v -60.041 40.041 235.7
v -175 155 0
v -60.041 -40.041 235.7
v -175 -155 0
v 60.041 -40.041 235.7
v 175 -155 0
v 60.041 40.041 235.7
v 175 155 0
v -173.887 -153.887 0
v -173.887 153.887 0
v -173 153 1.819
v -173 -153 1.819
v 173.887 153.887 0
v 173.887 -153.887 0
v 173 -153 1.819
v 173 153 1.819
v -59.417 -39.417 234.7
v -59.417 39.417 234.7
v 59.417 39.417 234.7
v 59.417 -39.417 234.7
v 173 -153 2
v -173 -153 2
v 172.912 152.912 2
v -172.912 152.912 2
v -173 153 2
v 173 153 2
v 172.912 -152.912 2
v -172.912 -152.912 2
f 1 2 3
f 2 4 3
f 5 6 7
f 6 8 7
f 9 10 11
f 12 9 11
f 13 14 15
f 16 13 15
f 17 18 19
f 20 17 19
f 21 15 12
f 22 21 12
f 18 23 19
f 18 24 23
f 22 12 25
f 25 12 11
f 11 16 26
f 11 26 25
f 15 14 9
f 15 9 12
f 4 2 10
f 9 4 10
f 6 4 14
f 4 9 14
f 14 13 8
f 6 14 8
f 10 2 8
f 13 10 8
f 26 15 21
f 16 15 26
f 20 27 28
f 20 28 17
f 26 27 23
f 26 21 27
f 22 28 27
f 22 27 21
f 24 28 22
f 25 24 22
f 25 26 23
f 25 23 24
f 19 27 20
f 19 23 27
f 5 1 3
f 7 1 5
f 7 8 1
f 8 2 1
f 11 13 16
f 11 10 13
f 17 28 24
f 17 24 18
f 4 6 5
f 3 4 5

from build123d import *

# Parameters (mm, degrees)
SKETCH1_W           = 350
SKETCH1_H           = 310
BOSS_EXTRUDE1_DEPTH = 235.7
BOSS_EXTRUDE1_TAPER = 26
SHELL1_T            = -1
SKETCH3_W           = 346
SKETCH3_H           = 306
CUT_EXTRUDE1_DEPTH  = 2


with BuildPart() as part:
    # Sketch1 → Boss-Extrude1 (new body)
    with BuildSketch(Plane.XY):
        Rectangle(SKETCH1_W, SKETCH1_H)
    extrude(amount=BOSS_EXTRUDE1_DEPTH, taper=BOSS_EXTRUDE1_TAPER)

    # Shell1
    shell1_openings = [part.faces().sort_by_distance(p)[0] for p in [
        (0, 0, 0),
    ]]
    offset(amount=SHELL1_T, openings=shell1_openings, kind=Kind.INTERSECTION)

    # Sketch3 → Cut-Extrude1 (cut)
    with BuildSketch(Plane(origin=(0, 0, 0), x_dir=(-1, 0, 0), z_dir=(0, 0, -1))):
        Rectangle(SKETCH3_W, SKETCH3_H)
    extrude(amount=-CUT_EXTRUDE1_DEPTH, mode=Mode.SUBTRACT)


solid = part.part
